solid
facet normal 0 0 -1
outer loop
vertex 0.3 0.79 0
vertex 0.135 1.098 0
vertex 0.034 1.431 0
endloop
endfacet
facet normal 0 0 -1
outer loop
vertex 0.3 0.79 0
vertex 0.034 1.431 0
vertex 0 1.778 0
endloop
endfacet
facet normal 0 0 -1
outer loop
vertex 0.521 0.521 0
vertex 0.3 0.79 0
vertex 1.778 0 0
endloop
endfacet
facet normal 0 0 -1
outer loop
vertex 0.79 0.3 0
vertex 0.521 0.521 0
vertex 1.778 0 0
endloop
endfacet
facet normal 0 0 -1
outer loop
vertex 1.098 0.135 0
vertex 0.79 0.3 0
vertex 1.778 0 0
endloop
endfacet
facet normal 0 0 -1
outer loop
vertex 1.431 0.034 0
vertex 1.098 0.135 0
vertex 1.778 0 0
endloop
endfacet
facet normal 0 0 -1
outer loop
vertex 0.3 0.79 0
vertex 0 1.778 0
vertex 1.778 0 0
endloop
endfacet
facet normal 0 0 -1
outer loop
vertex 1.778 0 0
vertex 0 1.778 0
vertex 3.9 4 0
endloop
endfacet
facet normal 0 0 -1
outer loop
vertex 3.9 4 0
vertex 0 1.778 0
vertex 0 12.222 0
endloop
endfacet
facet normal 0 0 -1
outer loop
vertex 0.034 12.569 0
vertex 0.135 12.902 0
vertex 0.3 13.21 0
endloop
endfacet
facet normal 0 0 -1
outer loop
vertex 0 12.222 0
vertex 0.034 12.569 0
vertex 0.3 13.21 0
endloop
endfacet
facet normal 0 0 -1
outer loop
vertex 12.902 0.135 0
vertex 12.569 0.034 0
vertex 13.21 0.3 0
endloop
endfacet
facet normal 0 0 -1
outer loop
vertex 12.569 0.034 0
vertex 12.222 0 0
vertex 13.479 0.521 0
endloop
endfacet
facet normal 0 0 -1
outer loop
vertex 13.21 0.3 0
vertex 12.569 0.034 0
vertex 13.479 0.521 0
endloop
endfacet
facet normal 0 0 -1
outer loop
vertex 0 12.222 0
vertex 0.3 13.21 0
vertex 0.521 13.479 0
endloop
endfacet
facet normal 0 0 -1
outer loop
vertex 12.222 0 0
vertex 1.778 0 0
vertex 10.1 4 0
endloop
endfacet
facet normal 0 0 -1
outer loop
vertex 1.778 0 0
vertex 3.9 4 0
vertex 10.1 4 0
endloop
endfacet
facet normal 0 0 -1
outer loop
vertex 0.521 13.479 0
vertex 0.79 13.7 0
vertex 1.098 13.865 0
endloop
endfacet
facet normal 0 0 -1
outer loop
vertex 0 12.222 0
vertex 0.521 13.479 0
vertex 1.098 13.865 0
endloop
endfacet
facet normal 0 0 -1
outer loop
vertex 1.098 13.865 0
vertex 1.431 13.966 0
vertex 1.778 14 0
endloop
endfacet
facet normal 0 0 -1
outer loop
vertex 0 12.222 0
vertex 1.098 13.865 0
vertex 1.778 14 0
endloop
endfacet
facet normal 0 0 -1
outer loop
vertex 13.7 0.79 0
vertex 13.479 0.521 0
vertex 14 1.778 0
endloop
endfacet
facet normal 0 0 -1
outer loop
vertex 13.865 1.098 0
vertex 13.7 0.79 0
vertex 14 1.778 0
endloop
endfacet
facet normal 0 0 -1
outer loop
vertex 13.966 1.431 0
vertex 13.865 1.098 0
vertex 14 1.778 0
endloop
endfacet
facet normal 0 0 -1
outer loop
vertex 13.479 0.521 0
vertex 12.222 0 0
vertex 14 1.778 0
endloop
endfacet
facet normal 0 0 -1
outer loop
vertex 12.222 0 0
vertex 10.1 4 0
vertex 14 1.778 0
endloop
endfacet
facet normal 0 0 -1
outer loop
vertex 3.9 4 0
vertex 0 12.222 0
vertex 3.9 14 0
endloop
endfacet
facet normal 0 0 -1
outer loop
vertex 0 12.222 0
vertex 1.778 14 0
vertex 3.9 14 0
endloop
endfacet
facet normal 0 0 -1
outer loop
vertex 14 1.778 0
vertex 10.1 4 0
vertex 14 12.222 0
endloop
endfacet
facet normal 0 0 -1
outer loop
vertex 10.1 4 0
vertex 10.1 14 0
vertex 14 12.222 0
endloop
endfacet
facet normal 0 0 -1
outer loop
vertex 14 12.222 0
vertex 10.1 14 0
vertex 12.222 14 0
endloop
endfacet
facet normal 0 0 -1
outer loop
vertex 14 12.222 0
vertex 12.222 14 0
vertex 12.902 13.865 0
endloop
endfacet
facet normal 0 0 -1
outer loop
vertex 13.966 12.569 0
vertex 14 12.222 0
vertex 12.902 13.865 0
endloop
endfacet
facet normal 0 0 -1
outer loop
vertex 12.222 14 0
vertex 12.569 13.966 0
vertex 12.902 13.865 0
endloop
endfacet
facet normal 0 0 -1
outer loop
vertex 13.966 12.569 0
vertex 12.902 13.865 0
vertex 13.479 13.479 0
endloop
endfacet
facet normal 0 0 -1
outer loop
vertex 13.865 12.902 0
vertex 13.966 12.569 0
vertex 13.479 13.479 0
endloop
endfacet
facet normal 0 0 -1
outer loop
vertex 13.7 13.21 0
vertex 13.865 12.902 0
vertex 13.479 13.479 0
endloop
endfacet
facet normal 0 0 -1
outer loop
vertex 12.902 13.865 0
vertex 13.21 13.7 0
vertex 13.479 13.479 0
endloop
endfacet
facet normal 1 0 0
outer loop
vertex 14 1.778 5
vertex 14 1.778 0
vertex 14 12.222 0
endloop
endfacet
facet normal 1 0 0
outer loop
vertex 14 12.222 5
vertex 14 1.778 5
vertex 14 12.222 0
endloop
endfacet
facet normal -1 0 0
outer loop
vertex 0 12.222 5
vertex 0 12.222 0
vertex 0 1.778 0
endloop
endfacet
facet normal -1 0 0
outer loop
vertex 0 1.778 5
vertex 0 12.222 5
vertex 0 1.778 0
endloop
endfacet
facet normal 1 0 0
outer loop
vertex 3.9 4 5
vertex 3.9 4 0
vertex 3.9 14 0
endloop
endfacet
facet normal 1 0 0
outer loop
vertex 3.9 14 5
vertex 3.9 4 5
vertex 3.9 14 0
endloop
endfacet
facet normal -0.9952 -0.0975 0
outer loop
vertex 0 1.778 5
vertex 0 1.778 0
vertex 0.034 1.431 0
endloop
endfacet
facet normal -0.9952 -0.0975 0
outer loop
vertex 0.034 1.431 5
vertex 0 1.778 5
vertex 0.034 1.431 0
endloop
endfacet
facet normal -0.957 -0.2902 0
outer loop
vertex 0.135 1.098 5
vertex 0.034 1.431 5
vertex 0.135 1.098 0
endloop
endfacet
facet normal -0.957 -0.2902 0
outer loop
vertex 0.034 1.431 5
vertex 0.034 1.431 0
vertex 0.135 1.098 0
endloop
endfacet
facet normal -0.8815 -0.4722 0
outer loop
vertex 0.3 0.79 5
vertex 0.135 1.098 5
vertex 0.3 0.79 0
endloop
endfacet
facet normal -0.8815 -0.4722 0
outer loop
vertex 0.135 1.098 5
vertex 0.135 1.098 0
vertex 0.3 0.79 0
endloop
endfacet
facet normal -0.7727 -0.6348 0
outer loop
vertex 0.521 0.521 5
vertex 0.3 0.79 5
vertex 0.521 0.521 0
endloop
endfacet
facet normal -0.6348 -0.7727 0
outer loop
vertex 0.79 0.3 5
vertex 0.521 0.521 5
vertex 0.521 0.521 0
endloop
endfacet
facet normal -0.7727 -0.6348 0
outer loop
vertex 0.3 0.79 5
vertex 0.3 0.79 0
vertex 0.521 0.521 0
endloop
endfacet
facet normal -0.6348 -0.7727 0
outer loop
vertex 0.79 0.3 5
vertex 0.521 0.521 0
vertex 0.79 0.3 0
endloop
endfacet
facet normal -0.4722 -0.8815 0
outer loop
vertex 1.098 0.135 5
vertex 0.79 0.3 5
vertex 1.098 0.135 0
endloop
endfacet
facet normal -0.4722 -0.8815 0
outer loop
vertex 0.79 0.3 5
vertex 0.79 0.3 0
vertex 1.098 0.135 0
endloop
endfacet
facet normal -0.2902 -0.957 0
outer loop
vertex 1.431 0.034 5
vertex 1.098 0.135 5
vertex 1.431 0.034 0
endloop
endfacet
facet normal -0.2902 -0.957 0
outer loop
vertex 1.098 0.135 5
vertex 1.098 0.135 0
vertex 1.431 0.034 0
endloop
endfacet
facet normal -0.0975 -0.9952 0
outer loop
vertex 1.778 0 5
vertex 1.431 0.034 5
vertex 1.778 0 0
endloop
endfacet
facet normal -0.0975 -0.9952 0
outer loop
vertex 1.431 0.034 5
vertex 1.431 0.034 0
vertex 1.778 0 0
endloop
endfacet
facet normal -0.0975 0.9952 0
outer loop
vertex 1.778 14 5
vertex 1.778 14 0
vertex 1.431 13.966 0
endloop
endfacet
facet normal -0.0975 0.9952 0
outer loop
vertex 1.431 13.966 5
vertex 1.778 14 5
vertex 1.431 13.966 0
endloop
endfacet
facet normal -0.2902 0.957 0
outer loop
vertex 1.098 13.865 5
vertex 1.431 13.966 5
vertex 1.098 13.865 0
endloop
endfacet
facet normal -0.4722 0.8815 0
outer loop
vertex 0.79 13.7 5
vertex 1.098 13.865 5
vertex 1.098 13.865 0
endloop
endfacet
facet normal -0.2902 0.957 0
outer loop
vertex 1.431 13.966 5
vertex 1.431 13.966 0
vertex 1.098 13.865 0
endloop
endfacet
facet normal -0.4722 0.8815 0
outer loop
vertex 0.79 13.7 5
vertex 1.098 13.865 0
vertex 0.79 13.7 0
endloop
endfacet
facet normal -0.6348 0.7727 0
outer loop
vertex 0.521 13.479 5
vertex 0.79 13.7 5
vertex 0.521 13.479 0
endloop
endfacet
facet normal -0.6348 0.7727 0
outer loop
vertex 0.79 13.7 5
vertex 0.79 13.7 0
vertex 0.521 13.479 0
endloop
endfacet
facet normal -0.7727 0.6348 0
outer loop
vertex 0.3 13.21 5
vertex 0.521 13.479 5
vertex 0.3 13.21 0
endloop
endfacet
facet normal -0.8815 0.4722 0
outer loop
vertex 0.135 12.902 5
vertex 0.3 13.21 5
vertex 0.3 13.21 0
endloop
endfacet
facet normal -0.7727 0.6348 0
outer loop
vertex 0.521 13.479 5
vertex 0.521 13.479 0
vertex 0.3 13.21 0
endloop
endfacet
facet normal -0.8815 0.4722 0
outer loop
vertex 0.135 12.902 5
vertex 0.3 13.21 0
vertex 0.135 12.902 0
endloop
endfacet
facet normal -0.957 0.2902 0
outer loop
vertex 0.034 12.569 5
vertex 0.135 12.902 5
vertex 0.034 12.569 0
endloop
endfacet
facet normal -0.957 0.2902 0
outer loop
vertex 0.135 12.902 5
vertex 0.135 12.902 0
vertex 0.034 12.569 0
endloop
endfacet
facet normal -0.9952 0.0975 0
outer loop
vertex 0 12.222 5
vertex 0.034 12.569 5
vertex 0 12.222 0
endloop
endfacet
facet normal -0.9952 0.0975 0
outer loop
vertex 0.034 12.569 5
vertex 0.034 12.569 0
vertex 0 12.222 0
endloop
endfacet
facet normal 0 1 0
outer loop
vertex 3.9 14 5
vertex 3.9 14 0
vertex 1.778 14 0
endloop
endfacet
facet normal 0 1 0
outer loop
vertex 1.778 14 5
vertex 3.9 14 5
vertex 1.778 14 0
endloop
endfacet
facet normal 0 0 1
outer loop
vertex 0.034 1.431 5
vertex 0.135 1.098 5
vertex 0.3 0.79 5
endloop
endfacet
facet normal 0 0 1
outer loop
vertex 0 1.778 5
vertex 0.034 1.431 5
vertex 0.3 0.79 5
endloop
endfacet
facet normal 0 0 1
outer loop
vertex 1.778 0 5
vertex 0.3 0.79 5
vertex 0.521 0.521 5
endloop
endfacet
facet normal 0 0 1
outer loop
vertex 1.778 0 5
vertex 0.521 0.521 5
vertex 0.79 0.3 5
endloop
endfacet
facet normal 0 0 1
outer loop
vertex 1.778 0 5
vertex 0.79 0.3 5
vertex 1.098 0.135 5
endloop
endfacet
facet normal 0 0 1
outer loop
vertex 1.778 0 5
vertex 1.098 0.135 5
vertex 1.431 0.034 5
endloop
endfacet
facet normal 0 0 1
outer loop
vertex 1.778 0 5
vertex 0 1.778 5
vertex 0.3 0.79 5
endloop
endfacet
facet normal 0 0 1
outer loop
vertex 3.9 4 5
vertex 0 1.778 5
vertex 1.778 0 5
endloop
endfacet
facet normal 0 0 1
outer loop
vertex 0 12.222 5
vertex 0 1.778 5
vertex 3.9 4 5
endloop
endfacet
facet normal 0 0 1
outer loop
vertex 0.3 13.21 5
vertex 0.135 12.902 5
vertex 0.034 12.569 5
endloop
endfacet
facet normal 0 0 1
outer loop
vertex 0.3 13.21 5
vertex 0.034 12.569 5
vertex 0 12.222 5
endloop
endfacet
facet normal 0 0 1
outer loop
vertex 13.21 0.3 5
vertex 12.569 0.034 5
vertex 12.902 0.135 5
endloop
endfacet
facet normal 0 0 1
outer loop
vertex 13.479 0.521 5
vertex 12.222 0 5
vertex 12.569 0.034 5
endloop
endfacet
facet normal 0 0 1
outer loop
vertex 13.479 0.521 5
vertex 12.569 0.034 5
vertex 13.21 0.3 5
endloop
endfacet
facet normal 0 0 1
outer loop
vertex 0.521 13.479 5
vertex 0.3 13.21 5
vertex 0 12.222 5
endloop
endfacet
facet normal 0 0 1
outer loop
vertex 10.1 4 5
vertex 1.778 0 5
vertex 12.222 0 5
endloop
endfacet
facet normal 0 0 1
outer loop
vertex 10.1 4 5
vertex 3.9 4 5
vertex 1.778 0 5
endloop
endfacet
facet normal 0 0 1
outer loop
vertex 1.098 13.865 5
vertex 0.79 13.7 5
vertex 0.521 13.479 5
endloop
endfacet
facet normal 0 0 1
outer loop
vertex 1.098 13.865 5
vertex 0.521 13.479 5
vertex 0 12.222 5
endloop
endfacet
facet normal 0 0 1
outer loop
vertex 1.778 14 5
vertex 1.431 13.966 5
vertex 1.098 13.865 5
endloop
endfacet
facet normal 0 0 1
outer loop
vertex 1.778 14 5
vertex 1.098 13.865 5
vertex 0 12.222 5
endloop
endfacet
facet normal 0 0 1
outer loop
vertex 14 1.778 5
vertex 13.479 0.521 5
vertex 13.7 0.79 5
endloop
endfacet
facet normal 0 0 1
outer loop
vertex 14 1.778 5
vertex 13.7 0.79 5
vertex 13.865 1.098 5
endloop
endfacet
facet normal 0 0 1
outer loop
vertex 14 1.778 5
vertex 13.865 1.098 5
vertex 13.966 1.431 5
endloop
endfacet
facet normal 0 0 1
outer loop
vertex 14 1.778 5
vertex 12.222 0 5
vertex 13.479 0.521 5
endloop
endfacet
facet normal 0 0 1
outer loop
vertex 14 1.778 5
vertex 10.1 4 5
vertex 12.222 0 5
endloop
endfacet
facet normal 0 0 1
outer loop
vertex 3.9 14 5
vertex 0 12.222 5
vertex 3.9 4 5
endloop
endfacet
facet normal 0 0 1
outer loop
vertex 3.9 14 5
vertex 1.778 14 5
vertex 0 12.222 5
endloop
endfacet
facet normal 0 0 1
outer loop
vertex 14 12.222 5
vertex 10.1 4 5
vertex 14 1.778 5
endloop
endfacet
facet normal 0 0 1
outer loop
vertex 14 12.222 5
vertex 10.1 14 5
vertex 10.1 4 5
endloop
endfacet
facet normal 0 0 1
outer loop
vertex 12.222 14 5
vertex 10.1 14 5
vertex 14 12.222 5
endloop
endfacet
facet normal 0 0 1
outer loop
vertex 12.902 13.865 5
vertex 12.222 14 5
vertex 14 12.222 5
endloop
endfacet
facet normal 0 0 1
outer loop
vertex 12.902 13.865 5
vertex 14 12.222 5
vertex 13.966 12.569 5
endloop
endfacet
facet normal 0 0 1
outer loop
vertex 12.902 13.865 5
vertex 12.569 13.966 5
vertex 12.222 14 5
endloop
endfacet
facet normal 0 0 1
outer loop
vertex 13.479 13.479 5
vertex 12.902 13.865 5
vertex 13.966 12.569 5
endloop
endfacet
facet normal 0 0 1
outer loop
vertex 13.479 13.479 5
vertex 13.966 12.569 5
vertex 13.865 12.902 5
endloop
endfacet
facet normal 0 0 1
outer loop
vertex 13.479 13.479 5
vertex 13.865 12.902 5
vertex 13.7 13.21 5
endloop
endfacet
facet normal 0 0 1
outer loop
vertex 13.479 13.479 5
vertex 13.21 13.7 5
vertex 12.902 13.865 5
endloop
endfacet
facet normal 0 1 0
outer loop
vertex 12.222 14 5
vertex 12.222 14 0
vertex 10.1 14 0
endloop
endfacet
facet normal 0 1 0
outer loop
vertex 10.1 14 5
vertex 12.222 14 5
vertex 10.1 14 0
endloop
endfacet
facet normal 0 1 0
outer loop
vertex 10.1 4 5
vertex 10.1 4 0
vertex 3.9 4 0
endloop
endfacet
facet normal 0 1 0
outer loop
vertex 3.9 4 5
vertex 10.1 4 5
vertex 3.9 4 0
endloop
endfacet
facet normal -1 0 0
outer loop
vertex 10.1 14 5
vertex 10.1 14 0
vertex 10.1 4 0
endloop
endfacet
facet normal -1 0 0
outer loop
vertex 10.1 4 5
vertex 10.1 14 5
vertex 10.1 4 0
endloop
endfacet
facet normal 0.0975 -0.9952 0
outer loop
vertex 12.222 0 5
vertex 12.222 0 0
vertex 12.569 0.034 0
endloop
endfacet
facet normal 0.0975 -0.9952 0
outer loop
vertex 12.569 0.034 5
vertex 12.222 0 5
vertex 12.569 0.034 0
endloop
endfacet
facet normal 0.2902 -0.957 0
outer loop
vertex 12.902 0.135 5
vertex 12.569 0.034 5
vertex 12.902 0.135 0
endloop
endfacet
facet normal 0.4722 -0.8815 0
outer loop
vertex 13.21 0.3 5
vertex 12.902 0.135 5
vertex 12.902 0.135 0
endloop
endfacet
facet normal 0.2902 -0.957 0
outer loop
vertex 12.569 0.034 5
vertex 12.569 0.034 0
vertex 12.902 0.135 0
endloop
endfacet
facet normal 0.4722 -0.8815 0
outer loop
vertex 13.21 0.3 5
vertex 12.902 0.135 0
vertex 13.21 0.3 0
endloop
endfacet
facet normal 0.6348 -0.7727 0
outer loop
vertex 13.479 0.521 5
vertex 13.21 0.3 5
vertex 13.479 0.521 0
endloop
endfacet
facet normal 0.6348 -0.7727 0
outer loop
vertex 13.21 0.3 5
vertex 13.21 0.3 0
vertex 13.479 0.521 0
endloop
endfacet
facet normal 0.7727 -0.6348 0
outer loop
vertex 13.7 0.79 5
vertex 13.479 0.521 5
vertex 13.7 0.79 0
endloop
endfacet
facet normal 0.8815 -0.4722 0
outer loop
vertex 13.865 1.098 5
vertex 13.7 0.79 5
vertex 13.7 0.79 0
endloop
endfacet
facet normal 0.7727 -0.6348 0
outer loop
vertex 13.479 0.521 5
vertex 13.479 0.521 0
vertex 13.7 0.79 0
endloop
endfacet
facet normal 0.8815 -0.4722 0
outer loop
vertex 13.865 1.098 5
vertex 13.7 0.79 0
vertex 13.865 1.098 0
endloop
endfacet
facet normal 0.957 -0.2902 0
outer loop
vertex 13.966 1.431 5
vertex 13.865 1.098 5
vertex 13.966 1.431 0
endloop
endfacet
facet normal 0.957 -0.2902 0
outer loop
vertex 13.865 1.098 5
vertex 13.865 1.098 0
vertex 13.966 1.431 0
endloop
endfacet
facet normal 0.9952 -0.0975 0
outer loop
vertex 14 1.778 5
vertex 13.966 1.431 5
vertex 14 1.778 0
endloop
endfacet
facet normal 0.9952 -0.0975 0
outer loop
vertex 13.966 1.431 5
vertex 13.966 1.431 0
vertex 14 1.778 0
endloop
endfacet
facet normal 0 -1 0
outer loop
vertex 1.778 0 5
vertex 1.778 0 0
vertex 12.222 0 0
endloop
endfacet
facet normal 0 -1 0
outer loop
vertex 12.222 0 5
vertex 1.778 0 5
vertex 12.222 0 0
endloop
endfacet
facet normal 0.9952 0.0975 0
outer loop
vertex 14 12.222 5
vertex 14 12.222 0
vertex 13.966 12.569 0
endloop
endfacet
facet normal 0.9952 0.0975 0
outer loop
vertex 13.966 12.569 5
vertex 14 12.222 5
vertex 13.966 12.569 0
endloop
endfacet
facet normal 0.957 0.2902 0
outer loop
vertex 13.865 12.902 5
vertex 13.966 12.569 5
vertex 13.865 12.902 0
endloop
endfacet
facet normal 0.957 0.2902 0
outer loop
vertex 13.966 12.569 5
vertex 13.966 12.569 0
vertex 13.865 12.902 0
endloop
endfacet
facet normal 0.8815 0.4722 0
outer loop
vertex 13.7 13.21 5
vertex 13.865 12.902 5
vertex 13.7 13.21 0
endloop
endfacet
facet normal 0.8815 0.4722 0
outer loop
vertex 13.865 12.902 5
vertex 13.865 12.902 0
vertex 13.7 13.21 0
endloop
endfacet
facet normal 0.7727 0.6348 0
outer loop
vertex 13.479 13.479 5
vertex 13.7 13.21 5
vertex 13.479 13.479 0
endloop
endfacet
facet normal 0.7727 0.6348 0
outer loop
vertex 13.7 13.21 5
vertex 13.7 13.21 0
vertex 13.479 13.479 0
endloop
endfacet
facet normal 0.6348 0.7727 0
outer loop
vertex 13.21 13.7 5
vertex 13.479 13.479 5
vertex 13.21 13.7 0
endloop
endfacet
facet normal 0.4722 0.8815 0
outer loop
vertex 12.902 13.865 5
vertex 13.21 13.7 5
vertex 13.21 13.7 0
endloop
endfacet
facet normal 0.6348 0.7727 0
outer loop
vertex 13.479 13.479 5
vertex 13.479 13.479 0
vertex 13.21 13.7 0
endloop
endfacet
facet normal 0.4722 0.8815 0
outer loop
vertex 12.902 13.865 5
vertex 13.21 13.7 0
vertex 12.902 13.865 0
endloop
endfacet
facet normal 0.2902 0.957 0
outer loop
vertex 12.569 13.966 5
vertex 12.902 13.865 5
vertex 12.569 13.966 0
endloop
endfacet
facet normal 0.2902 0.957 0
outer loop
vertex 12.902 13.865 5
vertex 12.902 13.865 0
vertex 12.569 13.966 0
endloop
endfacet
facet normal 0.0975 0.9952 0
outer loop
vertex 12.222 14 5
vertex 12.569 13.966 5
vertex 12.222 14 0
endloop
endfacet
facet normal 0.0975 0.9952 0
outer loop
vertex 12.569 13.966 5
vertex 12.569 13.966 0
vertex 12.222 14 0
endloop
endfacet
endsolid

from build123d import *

# Parameters (mm, degrees)
F1_DEPTH = 5


with BuildPart() as f1:
    # F0 (on Top) → F1 (new body)
    with BuildSketch(Plane.XY):
        with BuildLine():
            Line((0, 12.222), (0, 1.778))
            ThreePointArc((0, 1.778), (0.520764, 0.520764), (1.778, 0))
            Line((1.778, 0), (12.222, 0))
            ThreePointArc((12.222, 0), (13.479236, 0.520764), (14, 1.778))
            Line((14, 1.778), (14, 12.222))
            ThreePointArc((14, 12.222), (13.479236, 13.479236), (12.222, 14))
            Line((12.222, 14), (10.1, 14))
            Line((10.1, 14), (10.1, 4))
            Line((10.1, 4), (3.9, 4))
            Line((3.9, 4), (3.9, 14))
            Line((3.9, 14), (1.778, 14))
            ThreePointArc((1.778, 14), (0.520764, 13.479236), (0, 12.222))
        make_face()
    extrude(amount=F1_DEPTH)


solid = f1.part
